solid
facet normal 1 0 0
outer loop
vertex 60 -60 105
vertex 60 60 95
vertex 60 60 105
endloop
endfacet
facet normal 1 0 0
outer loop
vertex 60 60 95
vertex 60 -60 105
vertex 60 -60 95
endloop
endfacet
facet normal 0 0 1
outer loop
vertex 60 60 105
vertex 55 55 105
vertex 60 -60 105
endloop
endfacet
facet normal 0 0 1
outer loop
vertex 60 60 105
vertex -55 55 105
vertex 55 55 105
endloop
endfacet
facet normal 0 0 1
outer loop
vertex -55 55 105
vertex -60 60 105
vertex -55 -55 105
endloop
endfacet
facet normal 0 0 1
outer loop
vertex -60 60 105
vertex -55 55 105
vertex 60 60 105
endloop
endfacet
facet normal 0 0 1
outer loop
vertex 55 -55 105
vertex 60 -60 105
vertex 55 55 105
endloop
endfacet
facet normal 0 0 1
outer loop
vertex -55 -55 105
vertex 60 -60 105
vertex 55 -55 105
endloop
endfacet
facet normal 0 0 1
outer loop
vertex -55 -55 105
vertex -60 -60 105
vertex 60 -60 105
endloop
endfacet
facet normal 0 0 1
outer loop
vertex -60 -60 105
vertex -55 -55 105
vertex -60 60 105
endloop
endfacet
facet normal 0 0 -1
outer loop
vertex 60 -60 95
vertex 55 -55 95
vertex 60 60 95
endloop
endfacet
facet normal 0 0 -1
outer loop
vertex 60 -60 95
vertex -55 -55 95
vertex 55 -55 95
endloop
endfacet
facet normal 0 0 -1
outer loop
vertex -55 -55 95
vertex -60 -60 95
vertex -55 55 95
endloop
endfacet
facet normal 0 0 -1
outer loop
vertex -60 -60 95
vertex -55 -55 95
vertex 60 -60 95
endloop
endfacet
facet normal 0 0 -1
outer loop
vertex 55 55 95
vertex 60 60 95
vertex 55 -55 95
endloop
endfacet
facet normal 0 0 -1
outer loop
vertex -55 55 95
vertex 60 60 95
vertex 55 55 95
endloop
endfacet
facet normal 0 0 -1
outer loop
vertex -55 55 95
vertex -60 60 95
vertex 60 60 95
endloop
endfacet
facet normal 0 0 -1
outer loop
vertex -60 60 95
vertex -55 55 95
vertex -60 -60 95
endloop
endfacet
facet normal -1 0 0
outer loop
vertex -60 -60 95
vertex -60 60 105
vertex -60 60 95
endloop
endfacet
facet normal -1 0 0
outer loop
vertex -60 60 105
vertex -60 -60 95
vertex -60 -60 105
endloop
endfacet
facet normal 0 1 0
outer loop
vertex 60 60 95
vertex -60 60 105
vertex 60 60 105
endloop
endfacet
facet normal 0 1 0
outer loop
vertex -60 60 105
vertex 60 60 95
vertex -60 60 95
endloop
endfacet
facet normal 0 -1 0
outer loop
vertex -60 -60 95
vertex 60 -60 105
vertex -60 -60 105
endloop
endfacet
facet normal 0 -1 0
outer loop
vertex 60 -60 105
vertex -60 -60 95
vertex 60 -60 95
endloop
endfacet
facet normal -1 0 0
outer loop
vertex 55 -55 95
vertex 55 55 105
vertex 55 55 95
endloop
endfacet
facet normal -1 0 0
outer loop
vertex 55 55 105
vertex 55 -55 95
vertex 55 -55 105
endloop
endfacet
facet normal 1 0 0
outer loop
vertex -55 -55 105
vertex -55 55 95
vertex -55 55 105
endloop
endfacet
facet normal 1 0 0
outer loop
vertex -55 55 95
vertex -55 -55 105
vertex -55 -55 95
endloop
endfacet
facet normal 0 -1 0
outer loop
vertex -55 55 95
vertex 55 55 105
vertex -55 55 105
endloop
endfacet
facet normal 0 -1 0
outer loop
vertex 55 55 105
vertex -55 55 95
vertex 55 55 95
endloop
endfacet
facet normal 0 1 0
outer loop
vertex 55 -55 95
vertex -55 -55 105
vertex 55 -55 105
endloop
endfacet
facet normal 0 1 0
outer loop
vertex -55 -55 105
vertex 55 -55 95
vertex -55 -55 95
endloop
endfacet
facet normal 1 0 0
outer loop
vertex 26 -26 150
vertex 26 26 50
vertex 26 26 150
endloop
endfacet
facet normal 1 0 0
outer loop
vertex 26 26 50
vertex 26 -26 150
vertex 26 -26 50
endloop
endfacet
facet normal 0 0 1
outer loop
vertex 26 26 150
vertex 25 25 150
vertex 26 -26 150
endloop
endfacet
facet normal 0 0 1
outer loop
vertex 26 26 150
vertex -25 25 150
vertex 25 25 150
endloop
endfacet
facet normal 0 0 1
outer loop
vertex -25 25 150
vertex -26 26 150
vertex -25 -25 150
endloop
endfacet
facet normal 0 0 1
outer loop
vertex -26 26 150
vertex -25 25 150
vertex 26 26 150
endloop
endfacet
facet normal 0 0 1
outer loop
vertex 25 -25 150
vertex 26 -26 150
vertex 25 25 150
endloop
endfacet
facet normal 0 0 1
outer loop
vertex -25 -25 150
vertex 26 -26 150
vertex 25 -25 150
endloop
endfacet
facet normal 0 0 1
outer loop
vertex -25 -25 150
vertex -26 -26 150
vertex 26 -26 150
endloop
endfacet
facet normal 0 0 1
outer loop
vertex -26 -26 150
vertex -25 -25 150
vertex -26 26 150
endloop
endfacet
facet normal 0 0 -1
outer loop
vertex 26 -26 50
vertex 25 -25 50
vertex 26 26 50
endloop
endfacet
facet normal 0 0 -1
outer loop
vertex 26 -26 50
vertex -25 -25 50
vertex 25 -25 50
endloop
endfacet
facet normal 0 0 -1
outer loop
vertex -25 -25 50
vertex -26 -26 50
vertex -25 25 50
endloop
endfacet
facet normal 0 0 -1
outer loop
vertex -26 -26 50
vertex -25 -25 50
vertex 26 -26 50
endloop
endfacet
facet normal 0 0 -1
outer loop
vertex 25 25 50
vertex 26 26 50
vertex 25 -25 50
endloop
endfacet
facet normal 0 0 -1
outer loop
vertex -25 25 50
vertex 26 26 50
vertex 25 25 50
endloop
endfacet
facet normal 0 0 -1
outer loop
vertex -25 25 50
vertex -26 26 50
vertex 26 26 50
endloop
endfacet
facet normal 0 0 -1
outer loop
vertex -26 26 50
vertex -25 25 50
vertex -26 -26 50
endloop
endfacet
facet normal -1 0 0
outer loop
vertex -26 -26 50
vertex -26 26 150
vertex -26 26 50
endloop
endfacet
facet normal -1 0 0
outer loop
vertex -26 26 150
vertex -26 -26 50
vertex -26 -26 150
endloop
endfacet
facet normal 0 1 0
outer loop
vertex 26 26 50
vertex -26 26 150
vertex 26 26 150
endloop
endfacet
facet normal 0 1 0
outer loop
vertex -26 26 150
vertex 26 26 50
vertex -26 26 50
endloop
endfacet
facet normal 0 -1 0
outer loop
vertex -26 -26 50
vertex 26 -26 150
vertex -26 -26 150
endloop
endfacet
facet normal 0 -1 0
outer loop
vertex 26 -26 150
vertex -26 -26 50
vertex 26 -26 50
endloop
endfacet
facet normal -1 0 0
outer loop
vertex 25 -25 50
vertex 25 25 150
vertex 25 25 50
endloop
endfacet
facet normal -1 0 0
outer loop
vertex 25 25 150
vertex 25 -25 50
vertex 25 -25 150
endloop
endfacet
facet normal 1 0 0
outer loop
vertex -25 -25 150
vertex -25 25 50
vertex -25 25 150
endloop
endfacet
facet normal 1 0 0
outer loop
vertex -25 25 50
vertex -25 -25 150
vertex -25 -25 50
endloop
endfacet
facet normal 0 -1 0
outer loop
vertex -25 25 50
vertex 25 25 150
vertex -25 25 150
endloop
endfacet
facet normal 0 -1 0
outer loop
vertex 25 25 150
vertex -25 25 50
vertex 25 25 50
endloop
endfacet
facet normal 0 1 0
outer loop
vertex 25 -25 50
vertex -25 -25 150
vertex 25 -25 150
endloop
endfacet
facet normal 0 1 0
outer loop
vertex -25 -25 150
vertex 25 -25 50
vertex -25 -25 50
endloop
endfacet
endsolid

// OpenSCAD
module guan (kuan,long) {
    difference() {
        cube(size=[kuan+2, kuan+2, long], center=true);
        cube(size=[kuan, kuan, long], center=true);
    }
}


module main () {
    union() {
/*         translate([0, 0, 0]) {
            difference () {
                guan (120,1000);
                translate([60, 0, 0]) {
                    cube(size=[2, 100, 100], center=true);
                } 
            }
            translate([210, 0, 0]) {
                rotate([0, 90, 0]) {
                    guan (100,300) ;
                }
            }
        } */
        translate([0, 0, 100]) {
            difference() {
                cube(size=[120, 120, 10], center=true);
                cube(size=[110, 110, 10], center=true);
            }
        }
    }
}

main ();
translate([0, 0, 100]) 
guan(50,100);
